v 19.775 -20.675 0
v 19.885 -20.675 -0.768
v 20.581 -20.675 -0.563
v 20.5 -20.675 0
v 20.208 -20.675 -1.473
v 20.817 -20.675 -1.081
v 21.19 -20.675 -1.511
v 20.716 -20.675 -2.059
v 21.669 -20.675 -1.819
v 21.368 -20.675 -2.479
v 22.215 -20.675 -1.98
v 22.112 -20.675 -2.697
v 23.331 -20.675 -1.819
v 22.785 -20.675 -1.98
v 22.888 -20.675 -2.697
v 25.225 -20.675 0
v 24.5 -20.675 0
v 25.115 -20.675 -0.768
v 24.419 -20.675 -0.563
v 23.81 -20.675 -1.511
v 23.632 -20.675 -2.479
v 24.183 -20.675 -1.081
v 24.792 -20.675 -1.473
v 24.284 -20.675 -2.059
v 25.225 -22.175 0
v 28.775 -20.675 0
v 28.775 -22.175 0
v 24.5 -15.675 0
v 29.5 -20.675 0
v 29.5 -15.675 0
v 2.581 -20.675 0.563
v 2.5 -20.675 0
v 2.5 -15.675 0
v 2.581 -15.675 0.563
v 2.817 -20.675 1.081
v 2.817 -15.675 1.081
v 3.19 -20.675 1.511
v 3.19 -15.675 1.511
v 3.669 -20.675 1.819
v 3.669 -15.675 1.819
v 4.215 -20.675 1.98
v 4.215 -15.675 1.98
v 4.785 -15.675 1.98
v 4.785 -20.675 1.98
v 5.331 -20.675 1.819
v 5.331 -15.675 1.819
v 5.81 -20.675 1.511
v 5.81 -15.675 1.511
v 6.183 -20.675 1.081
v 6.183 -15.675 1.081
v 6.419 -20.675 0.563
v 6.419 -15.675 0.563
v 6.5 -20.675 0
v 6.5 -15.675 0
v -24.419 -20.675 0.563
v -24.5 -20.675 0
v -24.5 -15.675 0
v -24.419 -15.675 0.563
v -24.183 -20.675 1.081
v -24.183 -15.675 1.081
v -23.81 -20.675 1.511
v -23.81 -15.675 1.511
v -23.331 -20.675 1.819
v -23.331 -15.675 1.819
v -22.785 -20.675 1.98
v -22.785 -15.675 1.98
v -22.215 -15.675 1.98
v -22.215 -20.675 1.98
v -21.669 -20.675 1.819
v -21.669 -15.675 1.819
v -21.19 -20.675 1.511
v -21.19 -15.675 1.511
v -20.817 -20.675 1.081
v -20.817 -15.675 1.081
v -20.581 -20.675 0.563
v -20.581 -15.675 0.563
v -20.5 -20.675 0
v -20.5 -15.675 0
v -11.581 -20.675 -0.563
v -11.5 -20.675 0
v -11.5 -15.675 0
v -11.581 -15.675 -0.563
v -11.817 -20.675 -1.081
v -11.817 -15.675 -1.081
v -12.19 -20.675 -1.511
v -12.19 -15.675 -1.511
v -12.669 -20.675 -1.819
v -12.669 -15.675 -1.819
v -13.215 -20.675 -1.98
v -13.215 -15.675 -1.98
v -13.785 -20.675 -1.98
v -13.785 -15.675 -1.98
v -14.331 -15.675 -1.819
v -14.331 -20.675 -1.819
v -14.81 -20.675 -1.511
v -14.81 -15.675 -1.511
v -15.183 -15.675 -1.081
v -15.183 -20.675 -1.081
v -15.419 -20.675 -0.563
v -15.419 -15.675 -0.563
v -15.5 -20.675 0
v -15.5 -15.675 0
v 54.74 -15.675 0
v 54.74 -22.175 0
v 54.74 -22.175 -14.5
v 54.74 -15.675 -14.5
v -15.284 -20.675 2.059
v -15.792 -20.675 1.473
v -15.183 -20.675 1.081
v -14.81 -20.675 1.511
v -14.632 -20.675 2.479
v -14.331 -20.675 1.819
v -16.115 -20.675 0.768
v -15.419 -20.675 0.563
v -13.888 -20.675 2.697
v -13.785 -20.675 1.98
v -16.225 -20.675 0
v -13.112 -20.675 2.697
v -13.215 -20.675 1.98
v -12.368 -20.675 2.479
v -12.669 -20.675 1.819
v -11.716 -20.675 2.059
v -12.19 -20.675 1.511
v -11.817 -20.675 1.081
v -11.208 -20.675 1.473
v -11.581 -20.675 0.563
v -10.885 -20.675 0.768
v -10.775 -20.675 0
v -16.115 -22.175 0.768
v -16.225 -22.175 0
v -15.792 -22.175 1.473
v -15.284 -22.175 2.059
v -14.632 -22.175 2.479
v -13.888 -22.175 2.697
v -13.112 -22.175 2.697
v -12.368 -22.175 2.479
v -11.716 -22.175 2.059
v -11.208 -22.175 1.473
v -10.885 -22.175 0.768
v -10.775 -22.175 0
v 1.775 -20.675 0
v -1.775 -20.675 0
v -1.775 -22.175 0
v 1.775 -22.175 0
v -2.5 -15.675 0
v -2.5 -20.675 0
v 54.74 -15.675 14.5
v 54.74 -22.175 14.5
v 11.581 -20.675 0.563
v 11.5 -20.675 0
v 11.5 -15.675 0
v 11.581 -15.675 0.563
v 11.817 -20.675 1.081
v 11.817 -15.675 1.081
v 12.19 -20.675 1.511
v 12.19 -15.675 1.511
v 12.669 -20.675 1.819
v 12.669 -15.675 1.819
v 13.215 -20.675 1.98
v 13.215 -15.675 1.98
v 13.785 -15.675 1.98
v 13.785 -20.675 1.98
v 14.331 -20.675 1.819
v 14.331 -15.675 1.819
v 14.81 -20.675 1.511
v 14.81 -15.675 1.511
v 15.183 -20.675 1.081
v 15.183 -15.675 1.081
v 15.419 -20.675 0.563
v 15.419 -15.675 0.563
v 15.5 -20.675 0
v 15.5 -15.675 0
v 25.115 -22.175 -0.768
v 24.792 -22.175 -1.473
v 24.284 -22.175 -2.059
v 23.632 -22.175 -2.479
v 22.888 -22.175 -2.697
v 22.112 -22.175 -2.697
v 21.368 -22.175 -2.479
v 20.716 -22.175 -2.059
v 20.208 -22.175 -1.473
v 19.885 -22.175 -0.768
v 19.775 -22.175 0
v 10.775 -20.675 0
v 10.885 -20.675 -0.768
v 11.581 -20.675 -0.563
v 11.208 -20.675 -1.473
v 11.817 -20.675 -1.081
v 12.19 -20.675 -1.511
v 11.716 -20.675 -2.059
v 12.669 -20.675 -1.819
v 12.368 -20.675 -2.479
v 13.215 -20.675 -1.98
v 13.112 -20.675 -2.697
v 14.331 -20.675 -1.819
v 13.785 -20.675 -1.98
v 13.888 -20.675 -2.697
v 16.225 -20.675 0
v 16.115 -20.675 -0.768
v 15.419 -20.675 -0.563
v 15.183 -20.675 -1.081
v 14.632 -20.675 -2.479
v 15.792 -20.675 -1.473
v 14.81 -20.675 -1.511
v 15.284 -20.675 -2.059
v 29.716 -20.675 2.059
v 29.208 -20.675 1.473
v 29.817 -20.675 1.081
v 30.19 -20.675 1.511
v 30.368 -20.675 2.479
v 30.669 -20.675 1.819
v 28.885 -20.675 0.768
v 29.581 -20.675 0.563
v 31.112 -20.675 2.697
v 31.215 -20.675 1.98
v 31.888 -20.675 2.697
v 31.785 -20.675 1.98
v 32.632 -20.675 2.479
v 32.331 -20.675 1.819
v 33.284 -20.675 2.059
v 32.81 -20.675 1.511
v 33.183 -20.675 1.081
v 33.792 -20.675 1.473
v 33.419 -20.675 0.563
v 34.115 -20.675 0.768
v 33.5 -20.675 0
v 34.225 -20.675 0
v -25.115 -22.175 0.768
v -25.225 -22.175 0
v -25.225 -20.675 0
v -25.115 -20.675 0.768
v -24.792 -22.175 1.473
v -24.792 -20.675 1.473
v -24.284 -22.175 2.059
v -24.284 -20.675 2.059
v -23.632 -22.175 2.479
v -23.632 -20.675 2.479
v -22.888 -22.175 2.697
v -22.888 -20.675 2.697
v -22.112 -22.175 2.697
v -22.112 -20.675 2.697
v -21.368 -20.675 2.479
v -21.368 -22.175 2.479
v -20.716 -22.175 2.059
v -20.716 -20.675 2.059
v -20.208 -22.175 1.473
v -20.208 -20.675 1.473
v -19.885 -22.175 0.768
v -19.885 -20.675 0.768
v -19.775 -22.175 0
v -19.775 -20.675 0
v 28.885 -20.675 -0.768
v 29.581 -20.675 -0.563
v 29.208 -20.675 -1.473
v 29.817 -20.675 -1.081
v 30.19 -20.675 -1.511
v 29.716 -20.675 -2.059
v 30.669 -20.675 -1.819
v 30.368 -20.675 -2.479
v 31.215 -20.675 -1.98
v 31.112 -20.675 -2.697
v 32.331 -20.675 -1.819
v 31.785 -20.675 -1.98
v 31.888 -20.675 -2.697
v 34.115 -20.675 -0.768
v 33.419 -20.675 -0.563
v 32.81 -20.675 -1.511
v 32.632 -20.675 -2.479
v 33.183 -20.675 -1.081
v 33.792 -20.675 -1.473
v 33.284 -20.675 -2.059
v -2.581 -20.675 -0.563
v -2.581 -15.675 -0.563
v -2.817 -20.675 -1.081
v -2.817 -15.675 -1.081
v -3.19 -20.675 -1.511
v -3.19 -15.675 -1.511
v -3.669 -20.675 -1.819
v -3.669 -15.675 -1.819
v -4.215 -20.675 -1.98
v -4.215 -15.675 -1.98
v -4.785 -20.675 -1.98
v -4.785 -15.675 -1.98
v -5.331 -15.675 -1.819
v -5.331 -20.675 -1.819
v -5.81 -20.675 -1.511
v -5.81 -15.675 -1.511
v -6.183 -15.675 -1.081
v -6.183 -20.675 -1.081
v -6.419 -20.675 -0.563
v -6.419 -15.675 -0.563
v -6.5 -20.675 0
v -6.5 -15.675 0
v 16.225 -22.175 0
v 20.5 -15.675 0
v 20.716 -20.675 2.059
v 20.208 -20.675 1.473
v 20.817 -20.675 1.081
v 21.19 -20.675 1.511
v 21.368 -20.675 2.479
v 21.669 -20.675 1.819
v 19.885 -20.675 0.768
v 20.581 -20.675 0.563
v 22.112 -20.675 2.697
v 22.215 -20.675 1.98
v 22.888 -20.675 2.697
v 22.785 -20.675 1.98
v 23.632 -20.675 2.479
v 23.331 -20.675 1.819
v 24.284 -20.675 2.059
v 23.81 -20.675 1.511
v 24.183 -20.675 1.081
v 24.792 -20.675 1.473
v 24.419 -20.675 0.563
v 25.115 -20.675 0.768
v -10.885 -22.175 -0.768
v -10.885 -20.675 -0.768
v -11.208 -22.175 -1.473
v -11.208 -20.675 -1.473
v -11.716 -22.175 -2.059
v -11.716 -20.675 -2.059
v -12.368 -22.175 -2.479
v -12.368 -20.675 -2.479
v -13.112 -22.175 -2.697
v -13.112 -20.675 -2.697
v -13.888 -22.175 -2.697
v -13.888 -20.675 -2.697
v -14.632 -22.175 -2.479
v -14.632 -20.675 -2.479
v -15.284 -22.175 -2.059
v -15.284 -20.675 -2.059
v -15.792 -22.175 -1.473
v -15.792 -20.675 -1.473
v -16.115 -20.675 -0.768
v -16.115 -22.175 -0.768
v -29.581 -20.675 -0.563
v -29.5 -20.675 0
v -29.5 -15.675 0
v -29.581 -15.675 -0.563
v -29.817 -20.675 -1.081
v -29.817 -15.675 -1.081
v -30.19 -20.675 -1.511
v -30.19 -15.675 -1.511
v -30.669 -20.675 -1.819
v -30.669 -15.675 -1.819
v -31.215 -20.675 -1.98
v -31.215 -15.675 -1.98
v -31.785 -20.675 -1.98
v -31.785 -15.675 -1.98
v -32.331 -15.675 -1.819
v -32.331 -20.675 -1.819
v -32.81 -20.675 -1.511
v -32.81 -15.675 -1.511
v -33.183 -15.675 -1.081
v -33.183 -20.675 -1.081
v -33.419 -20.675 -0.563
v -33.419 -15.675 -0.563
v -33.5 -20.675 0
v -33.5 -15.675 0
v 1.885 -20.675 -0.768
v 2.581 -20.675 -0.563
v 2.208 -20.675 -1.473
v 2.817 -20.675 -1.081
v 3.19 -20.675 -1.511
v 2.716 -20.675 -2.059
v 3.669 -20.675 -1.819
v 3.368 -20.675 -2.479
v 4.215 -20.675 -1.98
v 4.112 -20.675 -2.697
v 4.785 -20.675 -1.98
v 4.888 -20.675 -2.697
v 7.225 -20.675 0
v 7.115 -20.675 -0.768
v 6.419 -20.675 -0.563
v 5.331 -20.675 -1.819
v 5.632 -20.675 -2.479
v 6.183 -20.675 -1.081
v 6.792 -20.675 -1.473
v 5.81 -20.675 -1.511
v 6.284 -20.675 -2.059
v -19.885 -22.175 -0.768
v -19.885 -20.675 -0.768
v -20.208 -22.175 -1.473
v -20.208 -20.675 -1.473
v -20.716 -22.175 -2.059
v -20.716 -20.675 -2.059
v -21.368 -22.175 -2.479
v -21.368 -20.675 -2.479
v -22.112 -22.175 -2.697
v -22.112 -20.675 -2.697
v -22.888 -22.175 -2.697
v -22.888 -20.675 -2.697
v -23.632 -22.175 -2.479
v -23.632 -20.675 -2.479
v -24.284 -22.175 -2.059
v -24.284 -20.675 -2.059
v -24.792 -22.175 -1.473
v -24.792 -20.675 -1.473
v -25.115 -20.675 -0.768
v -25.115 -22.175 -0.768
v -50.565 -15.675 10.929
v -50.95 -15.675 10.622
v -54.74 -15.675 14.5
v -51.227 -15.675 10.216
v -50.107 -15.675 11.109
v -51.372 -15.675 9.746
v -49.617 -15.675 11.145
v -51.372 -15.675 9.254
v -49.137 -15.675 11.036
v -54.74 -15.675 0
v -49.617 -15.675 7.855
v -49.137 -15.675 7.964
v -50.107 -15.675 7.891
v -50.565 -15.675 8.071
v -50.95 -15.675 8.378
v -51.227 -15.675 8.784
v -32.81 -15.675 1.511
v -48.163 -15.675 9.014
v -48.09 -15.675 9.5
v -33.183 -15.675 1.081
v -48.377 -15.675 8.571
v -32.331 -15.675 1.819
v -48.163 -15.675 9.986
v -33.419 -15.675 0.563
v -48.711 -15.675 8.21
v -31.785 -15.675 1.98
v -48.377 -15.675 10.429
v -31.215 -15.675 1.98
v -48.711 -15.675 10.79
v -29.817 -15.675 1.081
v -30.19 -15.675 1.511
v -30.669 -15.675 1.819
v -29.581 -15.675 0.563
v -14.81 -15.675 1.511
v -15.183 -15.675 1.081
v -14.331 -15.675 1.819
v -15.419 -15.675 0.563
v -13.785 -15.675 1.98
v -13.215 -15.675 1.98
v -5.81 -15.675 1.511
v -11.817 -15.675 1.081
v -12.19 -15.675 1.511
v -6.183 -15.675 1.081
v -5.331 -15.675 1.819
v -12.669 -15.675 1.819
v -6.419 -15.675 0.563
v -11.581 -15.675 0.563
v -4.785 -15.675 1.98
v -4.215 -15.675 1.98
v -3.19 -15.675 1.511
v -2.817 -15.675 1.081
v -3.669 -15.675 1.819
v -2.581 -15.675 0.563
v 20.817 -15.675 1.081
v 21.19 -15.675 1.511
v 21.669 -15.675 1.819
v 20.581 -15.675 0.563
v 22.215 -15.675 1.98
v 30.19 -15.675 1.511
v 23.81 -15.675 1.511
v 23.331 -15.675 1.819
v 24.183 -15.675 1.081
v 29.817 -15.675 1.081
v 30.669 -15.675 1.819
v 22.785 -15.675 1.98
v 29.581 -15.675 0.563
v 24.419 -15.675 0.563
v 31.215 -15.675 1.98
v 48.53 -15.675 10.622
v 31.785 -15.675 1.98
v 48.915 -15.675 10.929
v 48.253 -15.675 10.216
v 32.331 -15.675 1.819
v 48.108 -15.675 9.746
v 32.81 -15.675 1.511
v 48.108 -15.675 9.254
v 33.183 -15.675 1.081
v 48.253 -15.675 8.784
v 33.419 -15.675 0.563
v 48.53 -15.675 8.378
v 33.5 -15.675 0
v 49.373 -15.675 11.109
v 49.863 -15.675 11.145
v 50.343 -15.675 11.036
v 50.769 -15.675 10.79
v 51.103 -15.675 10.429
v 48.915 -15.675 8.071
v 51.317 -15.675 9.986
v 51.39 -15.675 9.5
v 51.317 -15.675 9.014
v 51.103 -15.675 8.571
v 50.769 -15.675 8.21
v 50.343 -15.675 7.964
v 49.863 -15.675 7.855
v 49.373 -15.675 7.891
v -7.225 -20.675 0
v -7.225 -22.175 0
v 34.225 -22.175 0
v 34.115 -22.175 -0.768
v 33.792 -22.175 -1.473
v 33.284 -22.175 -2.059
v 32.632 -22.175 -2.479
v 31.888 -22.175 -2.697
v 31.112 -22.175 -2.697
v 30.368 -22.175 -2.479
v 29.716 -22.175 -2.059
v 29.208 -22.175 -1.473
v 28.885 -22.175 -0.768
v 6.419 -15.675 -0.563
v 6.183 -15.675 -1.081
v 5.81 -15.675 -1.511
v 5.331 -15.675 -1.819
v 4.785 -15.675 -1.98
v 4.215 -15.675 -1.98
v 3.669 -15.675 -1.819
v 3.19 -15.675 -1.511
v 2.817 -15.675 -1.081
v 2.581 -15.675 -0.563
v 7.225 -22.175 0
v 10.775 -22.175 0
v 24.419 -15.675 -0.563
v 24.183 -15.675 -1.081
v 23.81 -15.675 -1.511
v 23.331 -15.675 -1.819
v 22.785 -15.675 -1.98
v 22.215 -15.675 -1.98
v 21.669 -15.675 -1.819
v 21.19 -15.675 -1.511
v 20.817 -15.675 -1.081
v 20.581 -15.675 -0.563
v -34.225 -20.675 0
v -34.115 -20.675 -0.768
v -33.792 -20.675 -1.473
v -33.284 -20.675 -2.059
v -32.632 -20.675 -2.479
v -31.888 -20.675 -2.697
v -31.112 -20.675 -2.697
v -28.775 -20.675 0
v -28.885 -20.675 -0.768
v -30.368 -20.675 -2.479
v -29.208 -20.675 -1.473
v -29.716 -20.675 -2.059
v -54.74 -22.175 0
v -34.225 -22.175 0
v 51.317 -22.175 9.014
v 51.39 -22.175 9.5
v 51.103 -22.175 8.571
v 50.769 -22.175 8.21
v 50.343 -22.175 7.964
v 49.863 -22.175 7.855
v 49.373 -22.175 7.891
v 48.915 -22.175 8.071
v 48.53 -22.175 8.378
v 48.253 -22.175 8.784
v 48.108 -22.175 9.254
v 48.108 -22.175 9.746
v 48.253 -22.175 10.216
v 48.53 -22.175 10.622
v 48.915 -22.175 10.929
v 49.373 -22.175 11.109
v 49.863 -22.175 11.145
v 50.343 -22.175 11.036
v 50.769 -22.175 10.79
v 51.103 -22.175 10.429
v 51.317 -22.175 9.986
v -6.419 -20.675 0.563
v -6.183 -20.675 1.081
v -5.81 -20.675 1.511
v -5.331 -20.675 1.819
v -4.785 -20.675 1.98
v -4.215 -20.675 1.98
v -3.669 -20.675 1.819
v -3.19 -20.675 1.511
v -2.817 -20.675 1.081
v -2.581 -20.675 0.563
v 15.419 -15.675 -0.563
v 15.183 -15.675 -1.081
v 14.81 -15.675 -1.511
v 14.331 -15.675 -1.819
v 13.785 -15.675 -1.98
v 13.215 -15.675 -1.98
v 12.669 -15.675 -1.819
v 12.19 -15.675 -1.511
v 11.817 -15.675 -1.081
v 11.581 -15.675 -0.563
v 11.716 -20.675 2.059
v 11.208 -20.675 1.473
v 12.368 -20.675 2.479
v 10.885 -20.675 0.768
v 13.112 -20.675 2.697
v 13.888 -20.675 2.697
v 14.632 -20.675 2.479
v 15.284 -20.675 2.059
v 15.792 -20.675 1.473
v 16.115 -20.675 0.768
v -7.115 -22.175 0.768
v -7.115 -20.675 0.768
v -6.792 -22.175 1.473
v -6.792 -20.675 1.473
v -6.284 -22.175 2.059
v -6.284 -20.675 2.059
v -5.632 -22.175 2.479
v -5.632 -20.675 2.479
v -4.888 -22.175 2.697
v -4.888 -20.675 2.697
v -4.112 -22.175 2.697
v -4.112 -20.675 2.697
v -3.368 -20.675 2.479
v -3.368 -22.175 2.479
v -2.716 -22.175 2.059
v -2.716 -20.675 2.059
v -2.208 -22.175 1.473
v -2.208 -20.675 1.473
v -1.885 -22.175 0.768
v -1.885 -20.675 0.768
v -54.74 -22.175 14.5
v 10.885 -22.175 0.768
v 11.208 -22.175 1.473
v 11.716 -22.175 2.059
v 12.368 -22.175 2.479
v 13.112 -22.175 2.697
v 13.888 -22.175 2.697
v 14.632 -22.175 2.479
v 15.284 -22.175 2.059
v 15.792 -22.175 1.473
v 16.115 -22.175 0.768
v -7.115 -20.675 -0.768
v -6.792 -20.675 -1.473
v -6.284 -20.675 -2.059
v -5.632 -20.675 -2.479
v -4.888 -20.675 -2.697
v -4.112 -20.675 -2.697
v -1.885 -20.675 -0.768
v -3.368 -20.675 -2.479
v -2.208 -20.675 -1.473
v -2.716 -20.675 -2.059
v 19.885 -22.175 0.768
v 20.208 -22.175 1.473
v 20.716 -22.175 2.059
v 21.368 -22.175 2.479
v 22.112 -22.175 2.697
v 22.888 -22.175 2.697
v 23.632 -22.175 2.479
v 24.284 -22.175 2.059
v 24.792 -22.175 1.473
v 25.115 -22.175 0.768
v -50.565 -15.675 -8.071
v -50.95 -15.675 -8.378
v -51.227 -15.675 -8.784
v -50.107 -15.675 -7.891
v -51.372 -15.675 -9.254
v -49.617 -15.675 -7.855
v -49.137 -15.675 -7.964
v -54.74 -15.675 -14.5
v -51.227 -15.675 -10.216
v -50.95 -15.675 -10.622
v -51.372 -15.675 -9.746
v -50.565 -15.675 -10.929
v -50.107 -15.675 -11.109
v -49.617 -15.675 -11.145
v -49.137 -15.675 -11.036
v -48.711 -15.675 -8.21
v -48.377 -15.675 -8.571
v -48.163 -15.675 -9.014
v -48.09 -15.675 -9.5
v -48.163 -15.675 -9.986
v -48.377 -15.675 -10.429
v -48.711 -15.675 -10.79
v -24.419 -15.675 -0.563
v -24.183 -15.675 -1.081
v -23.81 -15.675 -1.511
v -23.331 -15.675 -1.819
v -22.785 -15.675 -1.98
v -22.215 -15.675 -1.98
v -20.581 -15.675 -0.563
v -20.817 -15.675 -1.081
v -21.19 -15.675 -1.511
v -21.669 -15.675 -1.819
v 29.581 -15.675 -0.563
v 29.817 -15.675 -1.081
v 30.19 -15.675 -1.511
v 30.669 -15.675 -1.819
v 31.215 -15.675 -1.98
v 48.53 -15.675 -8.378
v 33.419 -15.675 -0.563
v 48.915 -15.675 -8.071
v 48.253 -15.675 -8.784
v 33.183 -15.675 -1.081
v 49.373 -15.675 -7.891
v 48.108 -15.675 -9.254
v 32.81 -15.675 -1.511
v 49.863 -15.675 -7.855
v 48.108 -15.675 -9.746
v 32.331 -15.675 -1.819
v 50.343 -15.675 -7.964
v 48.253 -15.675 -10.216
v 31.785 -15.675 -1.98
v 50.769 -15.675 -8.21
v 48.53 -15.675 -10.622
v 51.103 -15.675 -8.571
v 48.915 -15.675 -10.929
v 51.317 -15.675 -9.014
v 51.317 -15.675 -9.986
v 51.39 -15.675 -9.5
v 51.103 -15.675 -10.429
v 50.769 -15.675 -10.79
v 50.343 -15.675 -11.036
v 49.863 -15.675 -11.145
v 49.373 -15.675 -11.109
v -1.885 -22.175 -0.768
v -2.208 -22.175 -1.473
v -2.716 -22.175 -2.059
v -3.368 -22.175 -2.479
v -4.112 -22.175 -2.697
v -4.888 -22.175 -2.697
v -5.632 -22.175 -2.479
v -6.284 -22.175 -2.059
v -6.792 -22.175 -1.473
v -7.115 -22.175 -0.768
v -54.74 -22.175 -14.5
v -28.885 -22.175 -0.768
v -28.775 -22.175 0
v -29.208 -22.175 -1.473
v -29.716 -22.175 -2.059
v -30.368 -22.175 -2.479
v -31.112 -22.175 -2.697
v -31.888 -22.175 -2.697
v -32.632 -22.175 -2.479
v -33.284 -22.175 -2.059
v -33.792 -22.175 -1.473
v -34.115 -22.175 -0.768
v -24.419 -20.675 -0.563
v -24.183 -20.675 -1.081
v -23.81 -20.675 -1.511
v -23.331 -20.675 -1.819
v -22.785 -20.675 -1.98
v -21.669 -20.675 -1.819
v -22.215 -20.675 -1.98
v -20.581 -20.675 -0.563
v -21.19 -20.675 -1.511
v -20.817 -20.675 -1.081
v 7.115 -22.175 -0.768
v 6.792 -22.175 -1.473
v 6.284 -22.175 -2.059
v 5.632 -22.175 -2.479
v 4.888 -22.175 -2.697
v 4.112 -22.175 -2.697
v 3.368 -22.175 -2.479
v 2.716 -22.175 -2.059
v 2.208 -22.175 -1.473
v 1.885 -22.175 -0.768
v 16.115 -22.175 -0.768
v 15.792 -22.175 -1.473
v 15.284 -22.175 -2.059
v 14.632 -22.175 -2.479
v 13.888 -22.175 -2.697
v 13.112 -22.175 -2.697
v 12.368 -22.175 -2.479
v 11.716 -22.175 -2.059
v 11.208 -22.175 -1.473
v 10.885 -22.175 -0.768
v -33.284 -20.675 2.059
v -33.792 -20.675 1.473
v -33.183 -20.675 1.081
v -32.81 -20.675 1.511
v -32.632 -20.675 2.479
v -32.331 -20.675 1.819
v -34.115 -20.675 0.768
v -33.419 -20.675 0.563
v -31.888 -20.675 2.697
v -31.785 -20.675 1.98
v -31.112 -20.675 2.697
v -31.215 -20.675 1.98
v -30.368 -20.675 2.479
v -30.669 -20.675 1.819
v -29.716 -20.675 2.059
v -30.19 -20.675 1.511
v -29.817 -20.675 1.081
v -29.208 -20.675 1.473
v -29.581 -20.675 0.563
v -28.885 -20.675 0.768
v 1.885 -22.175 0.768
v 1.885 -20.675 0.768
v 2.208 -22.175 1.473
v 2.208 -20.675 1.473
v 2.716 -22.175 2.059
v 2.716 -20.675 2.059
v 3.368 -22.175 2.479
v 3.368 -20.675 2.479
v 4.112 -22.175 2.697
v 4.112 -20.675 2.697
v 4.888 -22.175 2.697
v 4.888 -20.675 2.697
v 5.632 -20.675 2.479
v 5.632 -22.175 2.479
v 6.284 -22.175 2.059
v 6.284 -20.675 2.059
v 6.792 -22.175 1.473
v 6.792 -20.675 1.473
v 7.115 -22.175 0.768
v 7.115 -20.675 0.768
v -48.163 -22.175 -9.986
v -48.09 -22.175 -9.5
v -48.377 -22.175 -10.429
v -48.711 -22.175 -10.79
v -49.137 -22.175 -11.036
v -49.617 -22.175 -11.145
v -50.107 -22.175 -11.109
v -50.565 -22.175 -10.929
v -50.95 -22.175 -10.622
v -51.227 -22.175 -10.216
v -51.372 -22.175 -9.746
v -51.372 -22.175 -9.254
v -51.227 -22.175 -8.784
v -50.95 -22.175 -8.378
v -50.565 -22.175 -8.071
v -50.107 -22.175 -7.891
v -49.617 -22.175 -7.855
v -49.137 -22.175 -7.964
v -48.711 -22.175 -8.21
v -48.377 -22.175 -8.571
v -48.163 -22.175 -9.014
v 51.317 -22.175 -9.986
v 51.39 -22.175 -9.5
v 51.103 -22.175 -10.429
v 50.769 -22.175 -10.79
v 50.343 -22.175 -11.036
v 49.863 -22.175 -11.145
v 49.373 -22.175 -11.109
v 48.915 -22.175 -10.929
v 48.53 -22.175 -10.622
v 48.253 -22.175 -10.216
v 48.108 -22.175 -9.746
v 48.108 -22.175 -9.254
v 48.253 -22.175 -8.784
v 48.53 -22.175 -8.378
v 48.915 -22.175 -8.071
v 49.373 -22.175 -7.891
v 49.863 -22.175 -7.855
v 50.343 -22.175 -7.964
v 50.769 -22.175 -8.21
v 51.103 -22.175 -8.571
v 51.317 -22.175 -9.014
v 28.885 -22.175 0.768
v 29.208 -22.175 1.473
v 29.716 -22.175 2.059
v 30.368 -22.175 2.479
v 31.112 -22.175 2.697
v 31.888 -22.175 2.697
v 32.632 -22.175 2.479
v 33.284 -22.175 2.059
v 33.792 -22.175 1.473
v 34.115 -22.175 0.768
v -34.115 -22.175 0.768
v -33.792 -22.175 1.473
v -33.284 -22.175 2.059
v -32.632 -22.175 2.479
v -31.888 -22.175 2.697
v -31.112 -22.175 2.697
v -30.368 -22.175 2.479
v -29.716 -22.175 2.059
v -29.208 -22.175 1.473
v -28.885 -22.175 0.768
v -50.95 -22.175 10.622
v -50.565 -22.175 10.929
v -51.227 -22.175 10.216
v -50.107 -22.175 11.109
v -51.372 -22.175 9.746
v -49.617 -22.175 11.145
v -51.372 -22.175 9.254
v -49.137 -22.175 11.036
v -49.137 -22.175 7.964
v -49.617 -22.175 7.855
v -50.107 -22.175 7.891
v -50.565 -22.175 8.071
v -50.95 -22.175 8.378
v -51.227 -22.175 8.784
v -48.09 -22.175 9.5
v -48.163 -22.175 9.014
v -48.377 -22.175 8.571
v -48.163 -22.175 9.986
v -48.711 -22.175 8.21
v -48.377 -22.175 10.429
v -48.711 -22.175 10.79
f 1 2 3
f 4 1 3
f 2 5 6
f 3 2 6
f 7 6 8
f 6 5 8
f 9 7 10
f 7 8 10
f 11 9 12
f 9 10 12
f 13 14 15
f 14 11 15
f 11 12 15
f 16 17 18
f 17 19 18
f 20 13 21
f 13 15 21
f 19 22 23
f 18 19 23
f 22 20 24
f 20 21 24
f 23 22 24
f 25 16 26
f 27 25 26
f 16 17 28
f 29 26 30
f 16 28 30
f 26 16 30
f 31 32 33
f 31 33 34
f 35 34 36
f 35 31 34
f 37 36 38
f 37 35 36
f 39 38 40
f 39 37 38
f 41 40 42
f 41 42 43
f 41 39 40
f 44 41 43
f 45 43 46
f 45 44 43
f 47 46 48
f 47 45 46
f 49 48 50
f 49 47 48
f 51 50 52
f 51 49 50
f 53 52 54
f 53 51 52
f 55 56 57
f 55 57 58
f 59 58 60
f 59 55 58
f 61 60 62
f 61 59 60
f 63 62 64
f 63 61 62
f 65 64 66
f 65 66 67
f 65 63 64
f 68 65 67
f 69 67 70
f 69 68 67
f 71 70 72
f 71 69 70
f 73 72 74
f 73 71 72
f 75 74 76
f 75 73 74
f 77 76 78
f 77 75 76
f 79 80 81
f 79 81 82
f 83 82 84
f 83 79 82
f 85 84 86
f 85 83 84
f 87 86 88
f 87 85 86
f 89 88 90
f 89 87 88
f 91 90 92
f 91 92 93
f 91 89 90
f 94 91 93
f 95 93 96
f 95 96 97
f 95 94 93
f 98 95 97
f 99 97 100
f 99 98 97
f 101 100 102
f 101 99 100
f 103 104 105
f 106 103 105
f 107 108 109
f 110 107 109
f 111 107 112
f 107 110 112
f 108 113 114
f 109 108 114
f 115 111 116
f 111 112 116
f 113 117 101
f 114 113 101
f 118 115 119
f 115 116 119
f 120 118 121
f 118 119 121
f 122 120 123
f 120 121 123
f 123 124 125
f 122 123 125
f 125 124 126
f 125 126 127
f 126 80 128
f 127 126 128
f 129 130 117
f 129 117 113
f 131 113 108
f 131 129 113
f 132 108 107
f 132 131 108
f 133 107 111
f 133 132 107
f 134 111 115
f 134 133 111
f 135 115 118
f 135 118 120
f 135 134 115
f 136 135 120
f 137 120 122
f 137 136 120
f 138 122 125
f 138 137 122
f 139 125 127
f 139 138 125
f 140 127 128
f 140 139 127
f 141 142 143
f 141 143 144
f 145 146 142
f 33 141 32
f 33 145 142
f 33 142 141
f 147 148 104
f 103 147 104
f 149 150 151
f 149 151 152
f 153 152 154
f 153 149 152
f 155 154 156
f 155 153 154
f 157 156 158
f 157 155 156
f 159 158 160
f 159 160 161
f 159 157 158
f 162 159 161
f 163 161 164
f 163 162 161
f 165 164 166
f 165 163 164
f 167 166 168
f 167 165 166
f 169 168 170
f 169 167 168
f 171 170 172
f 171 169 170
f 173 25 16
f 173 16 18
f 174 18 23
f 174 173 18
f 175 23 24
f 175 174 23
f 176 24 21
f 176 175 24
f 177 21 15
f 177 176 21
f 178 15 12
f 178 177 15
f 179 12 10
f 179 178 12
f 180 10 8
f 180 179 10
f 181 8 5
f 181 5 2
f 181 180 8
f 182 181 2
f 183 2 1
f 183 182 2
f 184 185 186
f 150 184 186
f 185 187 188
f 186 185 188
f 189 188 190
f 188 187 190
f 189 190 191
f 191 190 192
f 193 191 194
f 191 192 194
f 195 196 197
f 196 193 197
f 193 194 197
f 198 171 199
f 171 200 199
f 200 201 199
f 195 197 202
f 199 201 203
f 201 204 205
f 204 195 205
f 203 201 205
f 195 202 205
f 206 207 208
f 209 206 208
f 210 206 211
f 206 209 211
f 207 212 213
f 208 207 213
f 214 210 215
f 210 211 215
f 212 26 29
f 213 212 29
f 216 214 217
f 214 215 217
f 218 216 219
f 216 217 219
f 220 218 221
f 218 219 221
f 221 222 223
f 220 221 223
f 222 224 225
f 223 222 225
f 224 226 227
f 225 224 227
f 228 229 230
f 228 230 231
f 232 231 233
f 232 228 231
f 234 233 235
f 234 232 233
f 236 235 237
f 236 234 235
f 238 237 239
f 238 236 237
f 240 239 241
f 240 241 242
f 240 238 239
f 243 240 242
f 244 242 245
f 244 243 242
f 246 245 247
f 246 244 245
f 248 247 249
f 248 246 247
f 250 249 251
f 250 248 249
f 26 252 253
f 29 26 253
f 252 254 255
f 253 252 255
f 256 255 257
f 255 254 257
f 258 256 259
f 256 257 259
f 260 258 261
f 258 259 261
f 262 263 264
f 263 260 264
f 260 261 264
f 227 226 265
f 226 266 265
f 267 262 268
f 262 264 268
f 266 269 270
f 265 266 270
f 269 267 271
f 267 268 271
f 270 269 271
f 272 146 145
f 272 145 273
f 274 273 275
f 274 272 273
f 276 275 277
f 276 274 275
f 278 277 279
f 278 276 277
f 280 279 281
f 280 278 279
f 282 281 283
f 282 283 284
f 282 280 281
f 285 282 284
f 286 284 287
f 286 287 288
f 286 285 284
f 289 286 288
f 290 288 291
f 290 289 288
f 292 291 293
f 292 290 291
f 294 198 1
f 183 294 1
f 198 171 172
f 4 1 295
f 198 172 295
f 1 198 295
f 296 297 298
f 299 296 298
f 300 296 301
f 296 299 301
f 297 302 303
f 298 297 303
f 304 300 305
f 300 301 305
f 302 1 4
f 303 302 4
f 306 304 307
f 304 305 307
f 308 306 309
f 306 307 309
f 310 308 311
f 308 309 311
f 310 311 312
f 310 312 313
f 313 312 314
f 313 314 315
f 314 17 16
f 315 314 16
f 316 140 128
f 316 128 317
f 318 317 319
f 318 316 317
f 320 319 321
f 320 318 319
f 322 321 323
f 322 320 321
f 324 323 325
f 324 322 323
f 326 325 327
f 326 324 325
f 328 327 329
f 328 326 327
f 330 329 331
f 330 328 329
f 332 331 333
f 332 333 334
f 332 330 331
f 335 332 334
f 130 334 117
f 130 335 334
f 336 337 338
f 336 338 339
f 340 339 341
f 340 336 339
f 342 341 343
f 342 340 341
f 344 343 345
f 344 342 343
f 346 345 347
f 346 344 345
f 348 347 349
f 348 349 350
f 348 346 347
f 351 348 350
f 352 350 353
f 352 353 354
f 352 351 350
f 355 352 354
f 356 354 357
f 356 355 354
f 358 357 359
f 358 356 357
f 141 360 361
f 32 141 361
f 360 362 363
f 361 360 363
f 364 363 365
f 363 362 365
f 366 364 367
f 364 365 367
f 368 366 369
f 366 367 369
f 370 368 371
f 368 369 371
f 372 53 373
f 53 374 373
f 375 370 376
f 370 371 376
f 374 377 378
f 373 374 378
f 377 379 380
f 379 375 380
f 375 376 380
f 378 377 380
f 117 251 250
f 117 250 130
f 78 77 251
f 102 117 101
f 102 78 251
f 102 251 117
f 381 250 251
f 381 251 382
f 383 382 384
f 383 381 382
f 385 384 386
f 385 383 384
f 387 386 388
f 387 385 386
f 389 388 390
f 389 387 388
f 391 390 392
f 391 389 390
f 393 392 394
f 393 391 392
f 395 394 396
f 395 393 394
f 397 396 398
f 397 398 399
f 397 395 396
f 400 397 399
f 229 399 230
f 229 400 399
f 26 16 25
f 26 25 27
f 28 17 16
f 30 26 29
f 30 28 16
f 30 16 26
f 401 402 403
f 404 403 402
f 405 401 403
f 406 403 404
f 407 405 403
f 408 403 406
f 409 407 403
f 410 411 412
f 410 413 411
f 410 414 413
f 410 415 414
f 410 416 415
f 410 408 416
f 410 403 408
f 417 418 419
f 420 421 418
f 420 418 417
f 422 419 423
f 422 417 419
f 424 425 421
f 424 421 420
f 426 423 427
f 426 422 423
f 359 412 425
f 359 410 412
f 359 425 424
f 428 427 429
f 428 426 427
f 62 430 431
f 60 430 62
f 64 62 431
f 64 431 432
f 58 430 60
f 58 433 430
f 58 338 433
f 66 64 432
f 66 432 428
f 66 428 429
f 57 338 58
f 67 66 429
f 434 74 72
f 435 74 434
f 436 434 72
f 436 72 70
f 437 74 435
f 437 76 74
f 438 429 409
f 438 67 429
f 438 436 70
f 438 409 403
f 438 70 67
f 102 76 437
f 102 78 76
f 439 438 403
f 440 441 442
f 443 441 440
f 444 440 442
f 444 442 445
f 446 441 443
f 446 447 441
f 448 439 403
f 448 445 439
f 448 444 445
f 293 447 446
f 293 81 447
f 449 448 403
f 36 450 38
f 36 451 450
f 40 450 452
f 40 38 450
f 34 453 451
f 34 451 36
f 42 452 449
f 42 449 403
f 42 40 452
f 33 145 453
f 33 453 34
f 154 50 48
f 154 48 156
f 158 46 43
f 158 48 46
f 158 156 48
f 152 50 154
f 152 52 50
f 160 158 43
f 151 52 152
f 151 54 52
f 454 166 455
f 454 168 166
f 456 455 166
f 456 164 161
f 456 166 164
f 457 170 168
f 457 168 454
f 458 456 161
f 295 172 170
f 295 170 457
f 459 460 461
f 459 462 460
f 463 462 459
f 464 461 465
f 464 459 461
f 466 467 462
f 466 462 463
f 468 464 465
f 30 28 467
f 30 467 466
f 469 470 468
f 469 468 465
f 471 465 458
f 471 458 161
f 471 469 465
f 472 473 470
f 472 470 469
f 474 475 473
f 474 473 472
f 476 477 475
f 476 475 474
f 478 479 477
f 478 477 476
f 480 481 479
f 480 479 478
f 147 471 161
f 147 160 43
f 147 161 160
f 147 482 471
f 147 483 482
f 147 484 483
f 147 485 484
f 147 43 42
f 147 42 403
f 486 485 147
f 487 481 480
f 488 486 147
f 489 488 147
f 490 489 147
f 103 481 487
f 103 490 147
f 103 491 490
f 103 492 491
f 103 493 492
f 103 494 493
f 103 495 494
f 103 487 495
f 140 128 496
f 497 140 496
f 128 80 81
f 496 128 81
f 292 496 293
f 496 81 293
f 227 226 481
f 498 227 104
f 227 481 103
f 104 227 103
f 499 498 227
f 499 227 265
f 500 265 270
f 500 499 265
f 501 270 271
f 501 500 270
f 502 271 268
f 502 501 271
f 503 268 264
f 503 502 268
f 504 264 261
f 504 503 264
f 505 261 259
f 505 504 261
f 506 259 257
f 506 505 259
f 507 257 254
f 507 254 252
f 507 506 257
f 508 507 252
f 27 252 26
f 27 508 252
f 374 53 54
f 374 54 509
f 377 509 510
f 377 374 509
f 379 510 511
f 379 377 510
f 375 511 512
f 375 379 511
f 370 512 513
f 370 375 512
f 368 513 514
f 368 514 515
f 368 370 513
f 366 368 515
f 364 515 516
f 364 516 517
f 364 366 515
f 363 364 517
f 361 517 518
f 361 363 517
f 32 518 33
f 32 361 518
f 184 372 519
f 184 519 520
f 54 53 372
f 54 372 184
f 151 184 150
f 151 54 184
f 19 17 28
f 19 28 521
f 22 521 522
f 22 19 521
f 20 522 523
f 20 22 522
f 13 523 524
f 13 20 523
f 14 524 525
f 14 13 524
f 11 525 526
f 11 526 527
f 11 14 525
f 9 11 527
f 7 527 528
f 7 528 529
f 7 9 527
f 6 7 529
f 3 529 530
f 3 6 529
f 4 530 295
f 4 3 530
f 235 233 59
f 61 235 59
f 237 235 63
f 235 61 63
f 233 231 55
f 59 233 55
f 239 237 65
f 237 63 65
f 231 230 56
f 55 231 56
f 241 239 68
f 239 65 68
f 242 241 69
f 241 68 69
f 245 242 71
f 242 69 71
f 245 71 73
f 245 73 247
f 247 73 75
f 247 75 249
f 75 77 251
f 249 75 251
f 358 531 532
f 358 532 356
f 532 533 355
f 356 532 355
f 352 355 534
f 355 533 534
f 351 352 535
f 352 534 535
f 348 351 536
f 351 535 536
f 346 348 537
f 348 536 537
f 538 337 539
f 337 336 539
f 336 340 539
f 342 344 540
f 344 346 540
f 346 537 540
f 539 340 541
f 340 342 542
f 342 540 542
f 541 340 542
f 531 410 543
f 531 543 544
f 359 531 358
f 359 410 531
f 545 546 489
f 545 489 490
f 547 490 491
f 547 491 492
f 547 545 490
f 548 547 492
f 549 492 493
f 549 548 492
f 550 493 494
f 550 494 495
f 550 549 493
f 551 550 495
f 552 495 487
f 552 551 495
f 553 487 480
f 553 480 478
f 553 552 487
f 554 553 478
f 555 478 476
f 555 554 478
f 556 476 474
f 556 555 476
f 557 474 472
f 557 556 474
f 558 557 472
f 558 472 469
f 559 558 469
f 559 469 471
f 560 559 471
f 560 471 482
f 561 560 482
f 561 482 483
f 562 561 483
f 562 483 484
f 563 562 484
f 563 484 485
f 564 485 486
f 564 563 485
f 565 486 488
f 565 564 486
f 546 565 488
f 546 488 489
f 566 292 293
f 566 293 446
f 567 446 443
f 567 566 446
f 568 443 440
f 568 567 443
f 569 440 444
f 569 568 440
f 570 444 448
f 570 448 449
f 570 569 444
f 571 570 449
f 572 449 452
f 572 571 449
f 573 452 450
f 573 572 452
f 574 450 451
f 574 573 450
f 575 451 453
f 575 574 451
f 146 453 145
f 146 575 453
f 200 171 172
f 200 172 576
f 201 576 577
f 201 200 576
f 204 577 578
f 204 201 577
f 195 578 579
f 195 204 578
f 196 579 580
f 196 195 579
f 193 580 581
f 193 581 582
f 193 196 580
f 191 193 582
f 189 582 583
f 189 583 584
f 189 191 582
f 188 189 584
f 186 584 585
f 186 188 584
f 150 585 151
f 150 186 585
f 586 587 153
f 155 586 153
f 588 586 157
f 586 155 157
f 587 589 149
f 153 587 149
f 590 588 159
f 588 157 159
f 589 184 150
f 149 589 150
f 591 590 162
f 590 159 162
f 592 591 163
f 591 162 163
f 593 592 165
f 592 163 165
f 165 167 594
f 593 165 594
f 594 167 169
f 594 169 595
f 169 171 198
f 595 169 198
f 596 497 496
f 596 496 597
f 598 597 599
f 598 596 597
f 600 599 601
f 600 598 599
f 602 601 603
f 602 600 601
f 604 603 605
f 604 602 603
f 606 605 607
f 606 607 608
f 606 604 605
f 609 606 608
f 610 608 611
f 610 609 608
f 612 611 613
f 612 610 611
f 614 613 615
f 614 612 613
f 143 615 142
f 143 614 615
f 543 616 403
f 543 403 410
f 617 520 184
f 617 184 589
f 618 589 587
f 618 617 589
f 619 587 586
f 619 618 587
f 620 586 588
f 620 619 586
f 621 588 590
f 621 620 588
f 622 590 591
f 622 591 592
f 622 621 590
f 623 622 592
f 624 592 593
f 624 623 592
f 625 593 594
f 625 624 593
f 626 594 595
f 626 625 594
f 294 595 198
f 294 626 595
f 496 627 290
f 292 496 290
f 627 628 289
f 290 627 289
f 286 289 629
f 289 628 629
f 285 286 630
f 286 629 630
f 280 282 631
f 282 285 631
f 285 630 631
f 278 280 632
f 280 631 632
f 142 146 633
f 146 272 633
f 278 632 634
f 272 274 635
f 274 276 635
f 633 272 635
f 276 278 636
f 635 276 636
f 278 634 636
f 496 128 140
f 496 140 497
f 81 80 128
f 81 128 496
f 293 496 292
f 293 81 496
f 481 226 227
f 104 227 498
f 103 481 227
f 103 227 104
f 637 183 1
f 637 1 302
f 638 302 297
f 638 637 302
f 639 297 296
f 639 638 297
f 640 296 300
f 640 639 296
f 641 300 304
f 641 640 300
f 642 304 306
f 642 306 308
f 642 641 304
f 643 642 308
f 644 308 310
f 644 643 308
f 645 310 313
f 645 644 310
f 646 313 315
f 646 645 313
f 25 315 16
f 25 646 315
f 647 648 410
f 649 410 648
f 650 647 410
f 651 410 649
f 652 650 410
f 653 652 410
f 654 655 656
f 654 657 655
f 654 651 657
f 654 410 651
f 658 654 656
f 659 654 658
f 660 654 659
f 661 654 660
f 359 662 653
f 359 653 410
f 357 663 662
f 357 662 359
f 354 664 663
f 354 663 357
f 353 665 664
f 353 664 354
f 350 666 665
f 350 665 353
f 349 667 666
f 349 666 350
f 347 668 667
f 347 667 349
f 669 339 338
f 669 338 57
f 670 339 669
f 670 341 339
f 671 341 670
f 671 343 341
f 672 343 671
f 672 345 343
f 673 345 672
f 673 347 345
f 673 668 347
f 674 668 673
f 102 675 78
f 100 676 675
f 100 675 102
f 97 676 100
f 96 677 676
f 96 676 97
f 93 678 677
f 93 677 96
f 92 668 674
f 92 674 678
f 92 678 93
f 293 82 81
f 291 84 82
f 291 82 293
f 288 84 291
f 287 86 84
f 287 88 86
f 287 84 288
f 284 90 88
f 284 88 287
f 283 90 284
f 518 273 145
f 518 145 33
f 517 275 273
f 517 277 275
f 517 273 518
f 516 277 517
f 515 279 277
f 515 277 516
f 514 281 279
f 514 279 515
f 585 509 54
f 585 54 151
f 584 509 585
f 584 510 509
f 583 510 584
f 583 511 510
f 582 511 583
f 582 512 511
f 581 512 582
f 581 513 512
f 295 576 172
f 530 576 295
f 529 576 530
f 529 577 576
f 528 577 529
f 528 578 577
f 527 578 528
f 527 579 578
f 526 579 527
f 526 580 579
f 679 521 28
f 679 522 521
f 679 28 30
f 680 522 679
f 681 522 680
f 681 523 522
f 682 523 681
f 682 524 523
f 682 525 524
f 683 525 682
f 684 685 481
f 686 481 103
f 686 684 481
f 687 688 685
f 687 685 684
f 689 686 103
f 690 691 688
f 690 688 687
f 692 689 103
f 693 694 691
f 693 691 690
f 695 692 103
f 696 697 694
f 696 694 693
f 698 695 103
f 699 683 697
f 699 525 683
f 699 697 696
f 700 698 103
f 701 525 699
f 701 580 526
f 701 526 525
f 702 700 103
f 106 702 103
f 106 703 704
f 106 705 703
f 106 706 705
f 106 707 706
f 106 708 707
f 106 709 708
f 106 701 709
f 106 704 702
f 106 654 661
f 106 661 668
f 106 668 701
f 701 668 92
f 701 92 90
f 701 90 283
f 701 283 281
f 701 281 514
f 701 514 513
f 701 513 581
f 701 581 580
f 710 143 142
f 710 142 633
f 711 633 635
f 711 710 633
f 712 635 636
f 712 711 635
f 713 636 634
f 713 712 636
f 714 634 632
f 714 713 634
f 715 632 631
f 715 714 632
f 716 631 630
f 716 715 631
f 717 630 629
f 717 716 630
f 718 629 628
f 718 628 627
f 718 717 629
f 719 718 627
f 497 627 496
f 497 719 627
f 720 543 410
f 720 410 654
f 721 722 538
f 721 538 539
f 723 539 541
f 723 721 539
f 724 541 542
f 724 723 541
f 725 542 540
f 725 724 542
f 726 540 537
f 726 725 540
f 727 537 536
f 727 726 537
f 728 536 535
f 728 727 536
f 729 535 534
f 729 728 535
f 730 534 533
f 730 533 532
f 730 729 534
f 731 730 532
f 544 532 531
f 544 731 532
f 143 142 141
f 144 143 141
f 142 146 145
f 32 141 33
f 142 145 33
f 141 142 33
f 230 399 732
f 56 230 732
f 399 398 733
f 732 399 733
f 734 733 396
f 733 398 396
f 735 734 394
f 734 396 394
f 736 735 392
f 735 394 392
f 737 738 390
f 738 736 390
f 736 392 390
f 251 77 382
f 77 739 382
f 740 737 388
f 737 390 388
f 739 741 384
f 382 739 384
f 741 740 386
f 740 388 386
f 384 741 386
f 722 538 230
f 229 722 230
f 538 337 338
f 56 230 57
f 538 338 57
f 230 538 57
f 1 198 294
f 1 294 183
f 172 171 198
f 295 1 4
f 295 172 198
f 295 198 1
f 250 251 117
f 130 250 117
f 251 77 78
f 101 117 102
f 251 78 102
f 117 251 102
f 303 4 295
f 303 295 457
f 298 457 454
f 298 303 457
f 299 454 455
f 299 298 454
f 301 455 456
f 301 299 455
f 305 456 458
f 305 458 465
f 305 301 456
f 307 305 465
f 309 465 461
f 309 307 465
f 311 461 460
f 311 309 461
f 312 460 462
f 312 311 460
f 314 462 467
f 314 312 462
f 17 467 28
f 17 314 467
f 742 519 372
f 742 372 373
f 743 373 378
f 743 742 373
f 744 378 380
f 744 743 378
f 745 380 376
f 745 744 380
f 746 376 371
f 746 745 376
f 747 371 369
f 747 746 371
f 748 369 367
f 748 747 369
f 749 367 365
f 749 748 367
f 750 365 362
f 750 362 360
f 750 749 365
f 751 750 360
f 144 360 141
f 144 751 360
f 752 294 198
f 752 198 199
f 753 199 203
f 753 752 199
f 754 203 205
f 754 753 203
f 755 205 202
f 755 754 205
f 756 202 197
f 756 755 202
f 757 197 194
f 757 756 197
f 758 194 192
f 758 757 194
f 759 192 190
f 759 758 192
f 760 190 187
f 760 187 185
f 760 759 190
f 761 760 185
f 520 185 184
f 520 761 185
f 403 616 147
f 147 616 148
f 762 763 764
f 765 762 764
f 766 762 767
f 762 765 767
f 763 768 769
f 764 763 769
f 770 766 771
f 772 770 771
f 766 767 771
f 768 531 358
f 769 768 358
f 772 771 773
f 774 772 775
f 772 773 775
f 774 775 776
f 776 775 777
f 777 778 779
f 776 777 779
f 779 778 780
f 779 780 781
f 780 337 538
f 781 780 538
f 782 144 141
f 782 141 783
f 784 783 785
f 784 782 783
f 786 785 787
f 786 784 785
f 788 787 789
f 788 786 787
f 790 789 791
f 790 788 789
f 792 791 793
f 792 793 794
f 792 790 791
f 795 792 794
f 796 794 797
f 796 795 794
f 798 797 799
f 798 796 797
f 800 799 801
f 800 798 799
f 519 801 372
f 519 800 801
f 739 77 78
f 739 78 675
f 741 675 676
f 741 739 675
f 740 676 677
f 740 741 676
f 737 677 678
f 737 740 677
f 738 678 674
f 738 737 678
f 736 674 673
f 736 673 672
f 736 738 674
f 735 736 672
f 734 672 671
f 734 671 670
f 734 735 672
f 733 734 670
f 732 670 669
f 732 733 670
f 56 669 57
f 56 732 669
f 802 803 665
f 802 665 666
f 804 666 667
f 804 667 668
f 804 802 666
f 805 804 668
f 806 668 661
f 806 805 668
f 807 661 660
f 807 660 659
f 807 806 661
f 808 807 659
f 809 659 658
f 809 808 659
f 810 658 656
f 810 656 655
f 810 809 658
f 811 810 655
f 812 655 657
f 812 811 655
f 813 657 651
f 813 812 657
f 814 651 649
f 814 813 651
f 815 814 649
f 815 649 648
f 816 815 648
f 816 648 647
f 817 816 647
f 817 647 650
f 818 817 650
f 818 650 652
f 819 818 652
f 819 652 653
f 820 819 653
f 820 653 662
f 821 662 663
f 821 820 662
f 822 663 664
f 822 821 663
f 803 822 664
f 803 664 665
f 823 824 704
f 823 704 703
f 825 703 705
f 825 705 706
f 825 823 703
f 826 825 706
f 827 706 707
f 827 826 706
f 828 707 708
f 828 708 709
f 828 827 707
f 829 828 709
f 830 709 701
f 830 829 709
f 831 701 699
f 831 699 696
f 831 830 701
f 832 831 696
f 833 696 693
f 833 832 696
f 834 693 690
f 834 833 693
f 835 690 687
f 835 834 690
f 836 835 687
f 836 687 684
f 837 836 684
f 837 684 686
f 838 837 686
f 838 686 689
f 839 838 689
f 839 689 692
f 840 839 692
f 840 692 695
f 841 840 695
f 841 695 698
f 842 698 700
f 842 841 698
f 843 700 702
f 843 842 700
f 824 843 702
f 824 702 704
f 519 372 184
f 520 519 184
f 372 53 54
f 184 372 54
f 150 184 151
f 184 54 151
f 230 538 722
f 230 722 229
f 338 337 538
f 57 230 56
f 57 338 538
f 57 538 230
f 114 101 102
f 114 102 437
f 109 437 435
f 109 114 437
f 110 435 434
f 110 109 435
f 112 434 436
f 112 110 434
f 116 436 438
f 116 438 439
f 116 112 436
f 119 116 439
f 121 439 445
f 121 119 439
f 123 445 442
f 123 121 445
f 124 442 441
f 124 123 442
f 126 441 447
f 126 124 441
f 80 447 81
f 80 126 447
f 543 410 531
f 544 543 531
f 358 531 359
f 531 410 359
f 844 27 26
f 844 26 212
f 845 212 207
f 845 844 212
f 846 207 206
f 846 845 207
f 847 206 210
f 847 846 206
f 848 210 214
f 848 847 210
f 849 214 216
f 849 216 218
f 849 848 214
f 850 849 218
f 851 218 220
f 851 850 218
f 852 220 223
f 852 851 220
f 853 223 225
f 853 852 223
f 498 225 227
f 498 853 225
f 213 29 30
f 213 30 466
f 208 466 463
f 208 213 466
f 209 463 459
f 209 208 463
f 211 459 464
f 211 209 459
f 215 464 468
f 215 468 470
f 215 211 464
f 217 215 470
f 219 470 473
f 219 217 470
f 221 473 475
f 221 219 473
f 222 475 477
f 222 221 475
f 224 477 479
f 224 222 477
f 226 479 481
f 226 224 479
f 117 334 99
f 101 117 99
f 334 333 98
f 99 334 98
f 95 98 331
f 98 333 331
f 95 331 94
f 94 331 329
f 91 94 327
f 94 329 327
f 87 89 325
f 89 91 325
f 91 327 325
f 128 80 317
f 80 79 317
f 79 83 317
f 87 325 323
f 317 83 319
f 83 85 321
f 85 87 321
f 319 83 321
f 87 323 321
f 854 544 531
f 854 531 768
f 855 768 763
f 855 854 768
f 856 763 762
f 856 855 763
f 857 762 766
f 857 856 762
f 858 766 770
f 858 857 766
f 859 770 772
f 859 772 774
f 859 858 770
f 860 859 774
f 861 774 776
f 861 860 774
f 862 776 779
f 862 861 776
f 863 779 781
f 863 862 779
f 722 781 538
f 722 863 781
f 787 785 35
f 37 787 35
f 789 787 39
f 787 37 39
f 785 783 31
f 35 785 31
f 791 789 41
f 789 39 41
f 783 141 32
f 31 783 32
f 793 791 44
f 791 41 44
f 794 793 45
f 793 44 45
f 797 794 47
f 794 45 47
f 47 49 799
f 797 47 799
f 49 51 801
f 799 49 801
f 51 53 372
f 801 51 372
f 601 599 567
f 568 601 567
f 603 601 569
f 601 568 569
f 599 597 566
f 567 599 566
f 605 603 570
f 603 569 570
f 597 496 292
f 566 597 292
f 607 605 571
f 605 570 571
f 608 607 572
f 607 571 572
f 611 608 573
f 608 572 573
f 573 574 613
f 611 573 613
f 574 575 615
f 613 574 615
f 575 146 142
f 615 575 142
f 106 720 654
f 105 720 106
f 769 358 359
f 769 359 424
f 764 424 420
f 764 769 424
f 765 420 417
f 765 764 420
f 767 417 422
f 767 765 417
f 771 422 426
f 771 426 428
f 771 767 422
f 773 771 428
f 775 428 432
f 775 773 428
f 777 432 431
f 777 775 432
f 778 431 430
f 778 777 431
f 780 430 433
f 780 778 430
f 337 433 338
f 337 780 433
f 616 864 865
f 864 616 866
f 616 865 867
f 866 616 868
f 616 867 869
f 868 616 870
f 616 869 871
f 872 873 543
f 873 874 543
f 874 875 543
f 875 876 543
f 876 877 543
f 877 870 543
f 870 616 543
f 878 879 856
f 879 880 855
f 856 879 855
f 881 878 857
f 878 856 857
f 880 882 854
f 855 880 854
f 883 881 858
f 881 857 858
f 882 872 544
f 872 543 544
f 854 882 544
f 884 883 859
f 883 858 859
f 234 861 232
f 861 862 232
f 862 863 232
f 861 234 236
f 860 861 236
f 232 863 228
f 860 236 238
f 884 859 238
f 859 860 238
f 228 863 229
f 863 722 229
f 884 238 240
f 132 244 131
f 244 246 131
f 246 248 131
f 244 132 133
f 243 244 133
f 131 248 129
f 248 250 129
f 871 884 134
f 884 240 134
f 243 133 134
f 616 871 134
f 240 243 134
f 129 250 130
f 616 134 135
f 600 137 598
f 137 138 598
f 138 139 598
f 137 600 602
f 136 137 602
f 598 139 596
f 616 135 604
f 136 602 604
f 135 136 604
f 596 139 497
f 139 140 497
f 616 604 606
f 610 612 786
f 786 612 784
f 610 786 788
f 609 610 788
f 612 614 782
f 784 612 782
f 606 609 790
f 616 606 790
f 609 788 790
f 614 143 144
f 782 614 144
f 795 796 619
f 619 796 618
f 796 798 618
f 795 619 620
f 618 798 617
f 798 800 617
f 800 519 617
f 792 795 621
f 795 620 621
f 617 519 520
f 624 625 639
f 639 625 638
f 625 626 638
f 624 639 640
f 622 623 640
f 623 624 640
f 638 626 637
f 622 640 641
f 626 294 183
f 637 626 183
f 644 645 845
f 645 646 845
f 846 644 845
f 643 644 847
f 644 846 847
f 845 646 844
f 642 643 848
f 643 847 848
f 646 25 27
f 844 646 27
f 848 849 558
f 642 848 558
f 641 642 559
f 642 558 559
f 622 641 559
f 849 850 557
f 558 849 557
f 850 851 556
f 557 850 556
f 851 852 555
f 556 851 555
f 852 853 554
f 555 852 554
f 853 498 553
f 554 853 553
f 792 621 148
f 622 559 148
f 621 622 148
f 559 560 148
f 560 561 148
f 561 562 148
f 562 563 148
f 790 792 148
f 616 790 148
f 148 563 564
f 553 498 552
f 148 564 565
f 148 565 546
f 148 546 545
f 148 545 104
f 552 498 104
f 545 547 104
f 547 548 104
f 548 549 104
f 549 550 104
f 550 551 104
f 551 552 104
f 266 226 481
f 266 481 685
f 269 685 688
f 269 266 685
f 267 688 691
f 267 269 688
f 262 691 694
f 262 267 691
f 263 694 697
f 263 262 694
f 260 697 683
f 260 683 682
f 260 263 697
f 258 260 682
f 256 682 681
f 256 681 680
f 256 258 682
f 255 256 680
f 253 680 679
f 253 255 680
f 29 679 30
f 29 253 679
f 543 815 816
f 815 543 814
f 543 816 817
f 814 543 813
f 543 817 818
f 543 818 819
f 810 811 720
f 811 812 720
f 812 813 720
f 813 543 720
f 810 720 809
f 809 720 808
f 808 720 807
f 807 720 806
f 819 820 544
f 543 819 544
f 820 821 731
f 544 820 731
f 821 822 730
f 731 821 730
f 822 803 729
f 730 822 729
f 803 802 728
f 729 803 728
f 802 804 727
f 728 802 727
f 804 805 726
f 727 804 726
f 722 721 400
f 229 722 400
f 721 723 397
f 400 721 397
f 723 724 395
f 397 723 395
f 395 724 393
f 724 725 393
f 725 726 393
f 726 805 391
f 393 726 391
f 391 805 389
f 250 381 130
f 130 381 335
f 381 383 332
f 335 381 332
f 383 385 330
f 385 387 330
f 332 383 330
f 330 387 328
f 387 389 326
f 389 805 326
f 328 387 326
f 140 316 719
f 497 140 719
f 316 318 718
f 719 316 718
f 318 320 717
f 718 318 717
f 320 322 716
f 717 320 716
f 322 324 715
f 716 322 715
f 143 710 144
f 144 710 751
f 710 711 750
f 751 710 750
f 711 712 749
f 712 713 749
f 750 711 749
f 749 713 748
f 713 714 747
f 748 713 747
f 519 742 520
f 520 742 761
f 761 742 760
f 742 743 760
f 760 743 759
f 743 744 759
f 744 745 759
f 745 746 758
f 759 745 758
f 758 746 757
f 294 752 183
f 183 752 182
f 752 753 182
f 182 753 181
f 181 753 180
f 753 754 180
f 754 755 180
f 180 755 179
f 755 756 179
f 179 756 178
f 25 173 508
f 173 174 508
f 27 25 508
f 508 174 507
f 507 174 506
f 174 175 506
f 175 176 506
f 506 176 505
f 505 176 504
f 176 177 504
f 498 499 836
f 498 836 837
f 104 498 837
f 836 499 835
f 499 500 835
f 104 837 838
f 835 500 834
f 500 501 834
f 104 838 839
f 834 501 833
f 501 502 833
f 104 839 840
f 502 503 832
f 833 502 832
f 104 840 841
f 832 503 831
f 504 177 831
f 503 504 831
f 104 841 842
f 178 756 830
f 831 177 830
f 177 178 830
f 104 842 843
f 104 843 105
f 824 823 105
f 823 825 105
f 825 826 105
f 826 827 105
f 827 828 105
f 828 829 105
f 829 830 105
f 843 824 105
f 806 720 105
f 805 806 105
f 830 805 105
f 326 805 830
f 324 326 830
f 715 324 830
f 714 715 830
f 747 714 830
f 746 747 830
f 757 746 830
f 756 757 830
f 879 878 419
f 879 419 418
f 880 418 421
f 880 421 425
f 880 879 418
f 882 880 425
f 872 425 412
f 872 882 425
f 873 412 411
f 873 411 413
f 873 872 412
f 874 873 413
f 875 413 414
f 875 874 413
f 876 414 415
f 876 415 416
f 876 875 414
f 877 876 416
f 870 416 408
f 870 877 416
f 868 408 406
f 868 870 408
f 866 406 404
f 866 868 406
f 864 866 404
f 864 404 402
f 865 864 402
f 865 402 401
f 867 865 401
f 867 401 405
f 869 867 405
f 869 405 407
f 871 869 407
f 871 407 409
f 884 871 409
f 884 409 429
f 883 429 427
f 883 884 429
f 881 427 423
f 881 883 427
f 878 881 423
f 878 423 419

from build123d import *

# Parameters (mm, degrees)
STOCK_OPTICAL_UNIT_V3_1_START         = -22.175
STOCK_OPTICAL_UNIT_V3_1_OUTLINE_W     = 109.48
STOCK_OPTICAL_UNIT_V3_1_OUTLINE_H     = 29
STOCK_OPTICAL_UNIT_V3_1_OUTLINE_R     = 1.65
STOCK_OPTICAL_UNIT_V3_1_OUTLINE_R_2   = 2.725
STOCK_OPTICAL_UNIT_V3_1_DEPTH         = 6.5
STOCK_OPTICAL_UNIT_V3_1_START_2       = -20.675
STOCK_OPTICAL_UNIT_V3_1_2_OUTLINE_R   = 2.725
STOCK_OPTICAL_UNIT_V3_1_2_OUTLINE_R_2 = 2
STOCK_OPTICAL_UNIT_V3_1_2_DEPTH       = 5


# Read off the part's stored shape, not the designer's step: Stock-Optical_unit_v3-1
with BuildPart() as part:
    # Stock-Optical_unit_v3-1 outline → Stock-Optical_unit_v3-1 (new body)
    with BuildSketch(Plane(origin=(0, 0, 0), x_dir=(1, 0, 0), z_dir=(0, 1, 0)).offset(STOCK_OPTICAL_UNIT_V3_1_START)):
        Rectangle(STOCK_OPTICAL_UNIT_V3_1_OUTLINE_W, STOCK_OPTICAL_UNIT_V3_1_OUTLINE_H)
        with Locations((-49.74, -9.5)):
            Circle(STOCK_OPTICAL_UNIT_V3_1_OUTLINE_R, mode=Mode.SUBTRACT)
        with Locations((49.74, -9.5)):
            Circle(STOCK_OPTICAL_UNIT_V3_1_OUTLINE_R, mode=Mode.SUBTRACT)
        with Locations((-31.5, 0)):
            Circle(STOCK_OPTICAL_UNIT_V3_1_OUTLINE_R_2, mode=Mode.SUBTRACT)
        with Locations((-22.5, 0)):
            Circle(STOCK_OPTICAL_UNIT_V3_1_OUTLINE_R_2, mode=Mode.SUBTRACT)
        with Locations((-13.5, 0)):
            Circle(STOCK_OPTICAL_UNIT_V3_1_OUTLINE_R_2, mode=Mode.SUBTRACT)
        with Locations((-4.5, 0)):
            Circle(STOCK_OPTICAL_UNIT_V3_1_OUTLINE_R_2, mode=Mode.SUBTRACT)
        with Locations((-49.74, 9.5)):
            Circle(STOCK_OPTICAL_UNIT_V3_1_OUTLINE_R, mode=Mode.SUBTRACT)
        with Locations((4.5, 0)):
            Circle(STOCK_OPTICAL_UNIT_V3_1_OUTLINE_R_2, mode=Mode.SUBTRACT)
        with Locations((13.5, 0)):
            Circle(STOCK_OPTICAL_UNIT_V3_1_OUTLINE_R_2, mode=Mode.SUBTRACT)
        with Locations((22.5, 0)):
            Circle(STOCK_OPTICAL_UNIT_V3_1_OUTLINE_R_2, mode=Mode.SUBTRACT)
        with Locations((31.5, 0)):
            Circle(STOCK_OPTICAL_UNIT_V3_1_OUTLINE_R_2, mode=Mode.SUBTRACT)
        with Locations((49.74, 9.5)):
            Circle(STOCK_OPTICAL_UNIT_V3_1_OUTLINE_R, mode=Mode.SUBTRACT)
    extrude(amount=STOCK_OPTICAL_UNIT_V3_1_DEPTH)

    # Stock-Optical_unit_v3-1 2 outline → Stock-Optical_unit_v3-1 2 (add)
    # profile 1 of 8: a face of its own
    with BuildSketch(Plane(origin=(0, 0, 0), x_dir=(1, 0, 0), z_dir=(0, 1, 0)).offset(STOCK_OPTICAL_UNIT_V3_1_START_2)):
        with Locations((31.5, 0)):
            Circle(STOCK_OPTICAL_UNIT_V3_1_2_OUTLINE_R)
        with Locations((31.5, 0)):
            Circle(STOCK_OPTICAL_UNIT_V3_1_2_OUTLINE_R_2, mode=Mode.SUBTRACT)
    # profile 2 of 8: a face of its own
    with BuildSketch(Plane(origin=(0, 0, 0), x_dir=(1, 0, 0), z_dir=(0, 1, 0)).offset(STOCK_OPTICAL_UNIT_V3_1_START_2)):
        with Locations((22.5, 0)):
            Circle(STOCK_OPTICAL_UNIT_V3_1_2_OUTLINE_R)
        with Locations((22.5, 0)):
            Circle(STOCK_OPTICAL_UNIT_V3_1_2_OUTLINE_R_2, mode=Mode.SUBTRACT)
    # profile 3 of 8: a face of its own
    with BuildSketch(Plane(origin=(0, 0, 0), x_dir=(1, 0, 0), z_dir=(0, 1, 0)).offset(STOCK_OPTICAL_UNIT_V3_1_START_2)):
        with Locations((13.5, 0)):
            Circle(STOCK_OPTICAL_UNIT_V3_1_2_OUTLINE_R)
        with Locations((13.5, 0)):
            Circle(STOCK_OPTICAL_UNIT_V3_1_2_OUTLINE_R_2, mode=Mode.SUBTRACT)
    # profile 4 of 8: a face of its own
    with BuildSketch(Plane(origin=(0, 0, 0), x_dir=(1, 0, 0), z_dir=(0, 1, 0)).offset(STOCK_OPTICAL_UNIT_V3_1_START_2)):
        with Locations((4.5, 0)):
            Circle(STOCK_OPTICAL_UNIT_V3_1_2_OUTLINE_R)
        with Locations((4.5, 0)):
            Circle(STOCK_OPTICAL_UNIT_V3_1_2_OUTLINE_R_2, mode=Mode.SUBTRACT)
    # profile 5 of 8: a face of its own
    with BuildSketch(Plane(origin=(0, 0, 0), x_dir=(1, 0, 0), z_dir=(0, 1, 0)).offset(STOCK_OPTICAL_UNIT_V3_1_START_2)):
        with Locations((-4.5, 0)):
            Circle(STOCK_OPTICAL_UNIT_V3_1_2_OUTLINE_R)
        with Locations((-4.5, 0)):
            Circle(STOCK_OPTICAL_UNIT_V3_1_2_OUTLINE_R_2, mode=Mode.SUBTRACT)
    # profile 6 of 8: a face of its own
    with BuildSketch(Plane(origin=(0, 0, 0), x_dir=(1, 0, 0), z_dir=(0, 1, 0)).offset(STOCK_OPTICAL_UNIT_V3_1_START_2)):
        with Locations((-13.5, 0)):
            Circle(STOCK_OPTICAL_UNIT_V3_1_2_OUTLINE_R)
        with Locations((-13.5, 0)):
            Circle(STOCK_OPTICAL_UNIT_V3_1_2_OUTLINE_R_2, mode=Mode.SUBTRACT)
    # profile 7 of 8: a face of its own
    with BuildSketch(Plane(origin=(0, 0, 0), x_dir=(1, 0, 0), z_dir=(0, 1, 0)).offset(STOCK_OPTICAL_UNIT_V3_1_START_2)):
        with Locations((-22.5, 0)):
            Circle(STOCK_OPTICAL_UNIT_V3_1_2_OUTLINE_R)
        with Locations((-22.5, 0)):
            Circle(STOCK_OPTICAL_UNIT_V3_1_2_OUTLINE_R_2, mode=Mode.SUBTRACT)
    # profile 8 of 8: a face of its own
    with BuildSketch(Plane(origin=(0, 0, 0), x_dir=(1, 0, 0), z_dir=(0, 1, 0)).offset(STOCK_OPTICAL_UNIT_V3_1_START_2)):
        with Locations((-31.5, 0)):
            Circle(STOCK_OPTICAL_UNIT_V3_1_2_OUTLINE_R)
        with Locations((-31.5, 0)):
            Circle(STOCK_OPTICAL_UNIT_V3_1_2_OUTLINE_R_2, mode=Mode.SUBTRACT)
    extrude(amount=STOCK_OPTICAL_UNIT_V3_1_2_DEPTH)


with BuildPart() as body_2:
    # Split1: the piece on the far side of the plane
    add(part.part)
    split(bisect_by=Plane.XY, keep=Keep.BOTTOM)


with BuildPart() as part_1:
    add(part.part)

    # Split1
    split(bisect_by=Plane.XY, keep=Keep.TOP)


solid = Compound([body_2.part, part_1.part])
